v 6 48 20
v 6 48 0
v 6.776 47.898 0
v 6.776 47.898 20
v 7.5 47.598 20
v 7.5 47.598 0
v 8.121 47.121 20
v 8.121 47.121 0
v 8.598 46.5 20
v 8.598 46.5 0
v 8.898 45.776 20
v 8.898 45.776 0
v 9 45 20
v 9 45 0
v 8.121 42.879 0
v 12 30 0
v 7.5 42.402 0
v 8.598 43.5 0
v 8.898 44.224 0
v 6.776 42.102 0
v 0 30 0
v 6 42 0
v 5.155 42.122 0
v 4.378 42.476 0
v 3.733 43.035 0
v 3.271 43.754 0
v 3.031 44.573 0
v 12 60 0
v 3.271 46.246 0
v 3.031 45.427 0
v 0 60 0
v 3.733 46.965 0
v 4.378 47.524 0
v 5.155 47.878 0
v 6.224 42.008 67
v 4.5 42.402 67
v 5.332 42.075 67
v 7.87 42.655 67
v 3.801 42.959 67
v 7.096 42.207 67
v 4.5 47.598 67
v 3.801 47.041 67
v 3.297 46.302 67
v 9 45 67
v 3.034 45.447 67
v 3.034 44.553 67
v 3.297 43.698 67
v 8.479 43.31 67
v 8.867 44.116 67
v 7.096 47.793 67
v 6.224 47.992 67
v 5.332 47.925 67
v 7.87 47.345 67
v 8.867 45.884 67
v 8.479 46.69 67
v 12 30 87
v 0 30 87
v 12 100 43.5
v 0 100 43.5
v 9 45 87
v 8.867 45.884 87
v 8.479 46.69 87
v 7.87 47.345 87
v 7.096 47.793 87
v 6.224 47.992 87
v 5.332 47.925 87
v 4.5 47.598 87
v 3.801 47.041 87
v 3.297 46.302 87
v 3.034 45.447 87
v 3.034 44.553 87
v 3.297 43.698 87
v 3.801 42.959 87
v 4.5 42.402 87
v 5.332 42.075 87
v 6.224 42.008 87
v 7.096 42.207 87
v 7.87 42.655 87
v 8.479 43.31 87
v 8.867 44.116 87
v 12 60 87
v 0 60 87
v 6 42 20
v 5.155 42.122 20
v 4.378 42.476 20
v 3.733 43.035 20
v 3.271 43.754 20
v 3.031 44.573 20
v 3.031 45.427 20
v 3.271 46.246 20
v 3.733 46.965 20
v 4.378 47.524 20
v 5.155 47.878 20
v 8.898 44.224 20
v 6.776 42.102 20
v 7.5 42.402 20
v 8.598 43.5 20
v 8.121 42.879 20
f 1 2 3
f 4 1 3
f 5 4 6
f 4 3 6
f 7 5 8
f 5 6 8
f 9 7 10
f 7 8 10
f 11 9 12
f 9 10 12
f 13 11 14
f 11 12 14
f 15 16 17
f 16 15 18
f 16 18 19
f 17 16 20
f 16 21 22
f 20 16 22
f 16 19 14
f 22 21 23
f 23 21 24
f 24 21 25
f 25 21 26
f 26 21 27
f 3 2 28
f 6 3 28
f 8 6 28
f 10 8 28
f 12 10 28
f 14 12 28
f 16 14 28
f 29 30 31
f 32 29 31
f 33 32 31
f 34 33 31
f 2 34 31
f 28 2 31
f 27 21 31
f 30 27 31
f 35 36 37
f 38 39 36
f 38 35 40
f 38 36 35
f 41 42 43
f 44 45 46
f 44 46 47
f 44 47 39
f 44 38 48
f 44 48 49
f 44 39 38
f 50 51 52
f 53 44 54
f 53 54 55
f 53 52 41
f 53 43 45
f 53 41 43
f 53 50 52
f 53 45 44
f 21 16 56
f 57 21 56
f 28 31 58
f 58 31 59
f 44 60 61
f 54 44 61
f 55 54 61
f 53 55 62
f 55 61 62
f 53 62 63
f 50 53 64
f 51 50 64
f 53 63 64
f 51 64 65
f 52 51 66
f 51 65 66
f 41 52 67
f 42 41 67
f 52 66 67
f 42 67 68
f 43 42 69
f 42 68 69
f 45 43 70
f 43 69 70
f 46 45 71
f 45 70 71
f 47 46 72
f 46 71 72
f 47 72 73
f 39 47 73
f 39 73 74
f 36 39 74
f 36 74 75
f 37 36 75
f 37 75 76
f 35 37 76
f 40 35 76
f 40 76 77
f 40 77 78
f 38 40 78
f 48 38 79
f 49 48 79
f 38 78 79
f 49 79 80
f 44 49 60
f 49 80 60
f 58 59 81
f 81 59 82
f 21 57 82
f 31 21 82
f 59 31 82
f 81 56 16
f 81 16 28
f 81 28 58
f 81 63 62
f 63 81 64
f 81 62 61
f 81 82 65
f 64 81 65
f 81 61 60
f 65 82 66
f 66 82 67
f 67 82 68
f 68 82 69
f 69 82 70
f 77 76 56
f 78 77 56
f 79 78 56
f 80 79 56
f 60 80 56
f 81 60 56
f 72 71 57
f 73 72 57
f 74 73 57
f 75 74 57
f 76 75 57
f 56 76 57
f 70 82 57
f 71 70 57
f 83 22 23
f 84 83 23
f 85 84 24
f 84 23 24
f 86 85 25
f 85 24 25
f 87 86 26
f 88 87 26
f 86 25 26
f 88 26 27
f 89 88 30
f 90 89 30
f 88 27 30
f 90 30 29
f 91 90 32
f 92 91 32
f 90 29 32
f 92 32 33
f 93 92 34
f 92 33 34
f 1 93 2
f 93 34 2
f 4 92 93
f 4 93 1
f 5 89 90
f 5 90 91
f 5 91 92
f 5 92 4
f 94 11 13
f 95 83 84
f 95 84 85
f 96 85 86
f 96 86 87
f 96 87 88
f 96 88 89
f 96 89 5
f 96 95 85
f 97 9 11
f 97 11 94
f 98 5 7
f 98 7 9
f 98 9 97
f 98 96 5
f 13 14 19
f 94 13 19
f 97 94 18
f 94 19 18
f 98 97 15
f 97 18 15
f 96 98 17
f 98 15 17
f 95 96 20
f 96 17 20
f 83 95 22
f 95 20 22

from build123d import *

# Parameters (mm, degrees)
F1_DEPTH = 12
F2_R     = 3
F3_DEPTH = 20
F4_R     = 3
F5_DEPTH = 20
F6_W     = 30
F6_H     = 87
F7_DEPTH = 25


with BuildPart() as f1:
    # F0 (on Right) → F1 (new body)
    with BuildSketch(Plane.YZ):
        Polygon((0, 87), (0, 0), (60, 0), (100, 43.5), (60, 87), align=None)
    extrude(amount=F1_DEPTH)

    # F2 (on face) → F3 (cut)
    with BuildSketch(Plane.XY.offset(87)):
        with Locations((6, 45)):
            Circle(F2_R)
        with Locations((6, 15)):
            Circle(F2_R)
        with Locations((6, -15)):
            Circle(F2_R)
    extrude(amount=-F3_DEPTH, mode=Mode.SUBTRACT)

    # F4 (on face) → F5 (cut)
    with BuildSketch(Plane(origin=(0, 0, 0), x_dir=(1, 0, 0), z_dir=(0, 0, -1))):
        with BuildLine():
            ThreePointArc((9, -15), (8.12132, -12.87868), (6, -12))
            Line((6, -12), (6, -15))
            Line((6, -15), (6, -18))
            ThreePointArc((6, -18), (8.12132, -17.12132), (9, -15))
        make_face()
        with BuildLine():
            ThreePointArc((9, -45), (8.12132, -42.87868), (6, -42))
            Line((6, -42), (6, -45))
            Line((6, -45), (9, -45))
        make_face()
        with BuildLine():
            Line((6, -45), (6, -42))
            ThreePointArc((6, -42), (3, -45), (6, -48))
            Line((6, -48), (6, -45))
        make_face()
        with BuildLine():
            Line((6, -15), (6, -12))
            ThreePointArc((6, -12), (3, -15), (6, -18))
            Line((6, -18), (6, -15))
        make_face()
        with BuildLine():
            Line((9, -45), (6, -45))
            Line((6, -45), (6, -48))
            ThreePointArc((6, -48), (8.12132, -47.12132), (9, -45))
        make_face()
        with Locations((6, 15)):
            Circle(F4_R)
    extrude(amount=-F5_DEPTH, mode=Mode.SUBTRACT)

    # F6 (on face) → F7 (cut)
    with BuildSketch(Plane.YZ.offset(12)):
        with Locations((15, 43.5)):
            Rectangle(F6_W, F6_H)
    extrude(amount=-F7_DEPTH, mode=Mode.SUBTRACT)


solid = f1.part
